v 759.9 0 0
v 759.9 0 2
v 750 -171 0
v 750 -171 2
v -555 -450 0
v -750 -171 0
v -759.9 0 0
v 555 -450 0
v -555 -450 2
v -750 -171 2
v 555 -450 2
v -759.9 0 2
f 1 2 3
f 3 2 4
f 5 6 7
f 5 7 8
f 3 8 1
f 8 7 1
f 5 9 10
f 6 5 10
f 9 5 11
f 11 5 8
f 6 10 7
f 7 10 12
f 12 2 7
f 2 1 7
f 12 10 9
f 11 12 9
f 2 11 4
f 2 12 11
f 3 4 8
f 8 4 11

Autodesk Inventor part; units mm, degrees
ref_plane "YZ Plane" through (0, 0, 0) normal (1, 0, 0) x (0, 1, 0)
ref_plane "XZ Plane" through (0, 0, 0) normal (0, 1, 0) x (-1, 0, 0)
ref_plane "XY Plane" through (0, 0, 0) normal (0, 0, 1) x (1, 0, 0)
sketch "Sketch1" plane through (0, 0, 0) normal (0, 0, 1) x (1, 0, 0)
  line L0 (-760, -450) -> (760, -450)
  line L1 (760, -450) -> (760, 0)
  line L2 (760, 0) -> (-760, 0)
  line L3 (-760, 0) -> (-760, -450)
  point P0 (0, 0)
  point P1 (0, 0)
  dimension "d0" = 450
  dimension "d1" = 1520
extrude "Plate1" add sketch "Sketch1" along normal blind 2
sketch "Sketch2" plane through (0, 0, 2) normal (0, 0, 1) x (1, 0, 0)
  line L0 (760, -450) -> (-760, -450) projected
  line L1 (760, 0) -> (760, -450) projected
  line L2 (-760, 0) -> (760, 0) projected
  line L3 (-760, -450) -> (-760, 0) projected
  line L4 (759.9, 0) -> (750, -171)
  line L5 (750, -171) -> (555, -450)
  line L6 (760, -450) -> (-760, -450) projected
  point P0 (0, 0)
  dimension "d3" = 0.1
  dimension "d8" = 10
  dimension "d9" = 171
  dimension "d10" = 205
extrude "Extrusion1" cut sketch "Sketch2" against normal through all contours L0 L5 L4 L2 L1
mirror "Mirror1" about plane through (0, 0, 0) normal (1, 0, 0) of "Extrusion1"
equation "\"d2\" = Thickness"
equation "\"BendReliefWidth\" = Thickness"
equation "\"BendReliefDepth\" = 0.5 * Thickness"
equation "\"CornerReliefSize\" = 4 * Thickness"
equation "\"MinimumRemnant\" = 2 * Thickness"
equation "\"TransitionRadius\" = BendRadius"
equation "\"JacobiRadiusSize\" = BendRadius"
equation "\"GapSize\" = Thickness"
equation "\"Thickness\" = 2"
equation "\"BendRadius\" = 2.75"
properties part number "MSC 704 face 4" material "Stainless Steel"
